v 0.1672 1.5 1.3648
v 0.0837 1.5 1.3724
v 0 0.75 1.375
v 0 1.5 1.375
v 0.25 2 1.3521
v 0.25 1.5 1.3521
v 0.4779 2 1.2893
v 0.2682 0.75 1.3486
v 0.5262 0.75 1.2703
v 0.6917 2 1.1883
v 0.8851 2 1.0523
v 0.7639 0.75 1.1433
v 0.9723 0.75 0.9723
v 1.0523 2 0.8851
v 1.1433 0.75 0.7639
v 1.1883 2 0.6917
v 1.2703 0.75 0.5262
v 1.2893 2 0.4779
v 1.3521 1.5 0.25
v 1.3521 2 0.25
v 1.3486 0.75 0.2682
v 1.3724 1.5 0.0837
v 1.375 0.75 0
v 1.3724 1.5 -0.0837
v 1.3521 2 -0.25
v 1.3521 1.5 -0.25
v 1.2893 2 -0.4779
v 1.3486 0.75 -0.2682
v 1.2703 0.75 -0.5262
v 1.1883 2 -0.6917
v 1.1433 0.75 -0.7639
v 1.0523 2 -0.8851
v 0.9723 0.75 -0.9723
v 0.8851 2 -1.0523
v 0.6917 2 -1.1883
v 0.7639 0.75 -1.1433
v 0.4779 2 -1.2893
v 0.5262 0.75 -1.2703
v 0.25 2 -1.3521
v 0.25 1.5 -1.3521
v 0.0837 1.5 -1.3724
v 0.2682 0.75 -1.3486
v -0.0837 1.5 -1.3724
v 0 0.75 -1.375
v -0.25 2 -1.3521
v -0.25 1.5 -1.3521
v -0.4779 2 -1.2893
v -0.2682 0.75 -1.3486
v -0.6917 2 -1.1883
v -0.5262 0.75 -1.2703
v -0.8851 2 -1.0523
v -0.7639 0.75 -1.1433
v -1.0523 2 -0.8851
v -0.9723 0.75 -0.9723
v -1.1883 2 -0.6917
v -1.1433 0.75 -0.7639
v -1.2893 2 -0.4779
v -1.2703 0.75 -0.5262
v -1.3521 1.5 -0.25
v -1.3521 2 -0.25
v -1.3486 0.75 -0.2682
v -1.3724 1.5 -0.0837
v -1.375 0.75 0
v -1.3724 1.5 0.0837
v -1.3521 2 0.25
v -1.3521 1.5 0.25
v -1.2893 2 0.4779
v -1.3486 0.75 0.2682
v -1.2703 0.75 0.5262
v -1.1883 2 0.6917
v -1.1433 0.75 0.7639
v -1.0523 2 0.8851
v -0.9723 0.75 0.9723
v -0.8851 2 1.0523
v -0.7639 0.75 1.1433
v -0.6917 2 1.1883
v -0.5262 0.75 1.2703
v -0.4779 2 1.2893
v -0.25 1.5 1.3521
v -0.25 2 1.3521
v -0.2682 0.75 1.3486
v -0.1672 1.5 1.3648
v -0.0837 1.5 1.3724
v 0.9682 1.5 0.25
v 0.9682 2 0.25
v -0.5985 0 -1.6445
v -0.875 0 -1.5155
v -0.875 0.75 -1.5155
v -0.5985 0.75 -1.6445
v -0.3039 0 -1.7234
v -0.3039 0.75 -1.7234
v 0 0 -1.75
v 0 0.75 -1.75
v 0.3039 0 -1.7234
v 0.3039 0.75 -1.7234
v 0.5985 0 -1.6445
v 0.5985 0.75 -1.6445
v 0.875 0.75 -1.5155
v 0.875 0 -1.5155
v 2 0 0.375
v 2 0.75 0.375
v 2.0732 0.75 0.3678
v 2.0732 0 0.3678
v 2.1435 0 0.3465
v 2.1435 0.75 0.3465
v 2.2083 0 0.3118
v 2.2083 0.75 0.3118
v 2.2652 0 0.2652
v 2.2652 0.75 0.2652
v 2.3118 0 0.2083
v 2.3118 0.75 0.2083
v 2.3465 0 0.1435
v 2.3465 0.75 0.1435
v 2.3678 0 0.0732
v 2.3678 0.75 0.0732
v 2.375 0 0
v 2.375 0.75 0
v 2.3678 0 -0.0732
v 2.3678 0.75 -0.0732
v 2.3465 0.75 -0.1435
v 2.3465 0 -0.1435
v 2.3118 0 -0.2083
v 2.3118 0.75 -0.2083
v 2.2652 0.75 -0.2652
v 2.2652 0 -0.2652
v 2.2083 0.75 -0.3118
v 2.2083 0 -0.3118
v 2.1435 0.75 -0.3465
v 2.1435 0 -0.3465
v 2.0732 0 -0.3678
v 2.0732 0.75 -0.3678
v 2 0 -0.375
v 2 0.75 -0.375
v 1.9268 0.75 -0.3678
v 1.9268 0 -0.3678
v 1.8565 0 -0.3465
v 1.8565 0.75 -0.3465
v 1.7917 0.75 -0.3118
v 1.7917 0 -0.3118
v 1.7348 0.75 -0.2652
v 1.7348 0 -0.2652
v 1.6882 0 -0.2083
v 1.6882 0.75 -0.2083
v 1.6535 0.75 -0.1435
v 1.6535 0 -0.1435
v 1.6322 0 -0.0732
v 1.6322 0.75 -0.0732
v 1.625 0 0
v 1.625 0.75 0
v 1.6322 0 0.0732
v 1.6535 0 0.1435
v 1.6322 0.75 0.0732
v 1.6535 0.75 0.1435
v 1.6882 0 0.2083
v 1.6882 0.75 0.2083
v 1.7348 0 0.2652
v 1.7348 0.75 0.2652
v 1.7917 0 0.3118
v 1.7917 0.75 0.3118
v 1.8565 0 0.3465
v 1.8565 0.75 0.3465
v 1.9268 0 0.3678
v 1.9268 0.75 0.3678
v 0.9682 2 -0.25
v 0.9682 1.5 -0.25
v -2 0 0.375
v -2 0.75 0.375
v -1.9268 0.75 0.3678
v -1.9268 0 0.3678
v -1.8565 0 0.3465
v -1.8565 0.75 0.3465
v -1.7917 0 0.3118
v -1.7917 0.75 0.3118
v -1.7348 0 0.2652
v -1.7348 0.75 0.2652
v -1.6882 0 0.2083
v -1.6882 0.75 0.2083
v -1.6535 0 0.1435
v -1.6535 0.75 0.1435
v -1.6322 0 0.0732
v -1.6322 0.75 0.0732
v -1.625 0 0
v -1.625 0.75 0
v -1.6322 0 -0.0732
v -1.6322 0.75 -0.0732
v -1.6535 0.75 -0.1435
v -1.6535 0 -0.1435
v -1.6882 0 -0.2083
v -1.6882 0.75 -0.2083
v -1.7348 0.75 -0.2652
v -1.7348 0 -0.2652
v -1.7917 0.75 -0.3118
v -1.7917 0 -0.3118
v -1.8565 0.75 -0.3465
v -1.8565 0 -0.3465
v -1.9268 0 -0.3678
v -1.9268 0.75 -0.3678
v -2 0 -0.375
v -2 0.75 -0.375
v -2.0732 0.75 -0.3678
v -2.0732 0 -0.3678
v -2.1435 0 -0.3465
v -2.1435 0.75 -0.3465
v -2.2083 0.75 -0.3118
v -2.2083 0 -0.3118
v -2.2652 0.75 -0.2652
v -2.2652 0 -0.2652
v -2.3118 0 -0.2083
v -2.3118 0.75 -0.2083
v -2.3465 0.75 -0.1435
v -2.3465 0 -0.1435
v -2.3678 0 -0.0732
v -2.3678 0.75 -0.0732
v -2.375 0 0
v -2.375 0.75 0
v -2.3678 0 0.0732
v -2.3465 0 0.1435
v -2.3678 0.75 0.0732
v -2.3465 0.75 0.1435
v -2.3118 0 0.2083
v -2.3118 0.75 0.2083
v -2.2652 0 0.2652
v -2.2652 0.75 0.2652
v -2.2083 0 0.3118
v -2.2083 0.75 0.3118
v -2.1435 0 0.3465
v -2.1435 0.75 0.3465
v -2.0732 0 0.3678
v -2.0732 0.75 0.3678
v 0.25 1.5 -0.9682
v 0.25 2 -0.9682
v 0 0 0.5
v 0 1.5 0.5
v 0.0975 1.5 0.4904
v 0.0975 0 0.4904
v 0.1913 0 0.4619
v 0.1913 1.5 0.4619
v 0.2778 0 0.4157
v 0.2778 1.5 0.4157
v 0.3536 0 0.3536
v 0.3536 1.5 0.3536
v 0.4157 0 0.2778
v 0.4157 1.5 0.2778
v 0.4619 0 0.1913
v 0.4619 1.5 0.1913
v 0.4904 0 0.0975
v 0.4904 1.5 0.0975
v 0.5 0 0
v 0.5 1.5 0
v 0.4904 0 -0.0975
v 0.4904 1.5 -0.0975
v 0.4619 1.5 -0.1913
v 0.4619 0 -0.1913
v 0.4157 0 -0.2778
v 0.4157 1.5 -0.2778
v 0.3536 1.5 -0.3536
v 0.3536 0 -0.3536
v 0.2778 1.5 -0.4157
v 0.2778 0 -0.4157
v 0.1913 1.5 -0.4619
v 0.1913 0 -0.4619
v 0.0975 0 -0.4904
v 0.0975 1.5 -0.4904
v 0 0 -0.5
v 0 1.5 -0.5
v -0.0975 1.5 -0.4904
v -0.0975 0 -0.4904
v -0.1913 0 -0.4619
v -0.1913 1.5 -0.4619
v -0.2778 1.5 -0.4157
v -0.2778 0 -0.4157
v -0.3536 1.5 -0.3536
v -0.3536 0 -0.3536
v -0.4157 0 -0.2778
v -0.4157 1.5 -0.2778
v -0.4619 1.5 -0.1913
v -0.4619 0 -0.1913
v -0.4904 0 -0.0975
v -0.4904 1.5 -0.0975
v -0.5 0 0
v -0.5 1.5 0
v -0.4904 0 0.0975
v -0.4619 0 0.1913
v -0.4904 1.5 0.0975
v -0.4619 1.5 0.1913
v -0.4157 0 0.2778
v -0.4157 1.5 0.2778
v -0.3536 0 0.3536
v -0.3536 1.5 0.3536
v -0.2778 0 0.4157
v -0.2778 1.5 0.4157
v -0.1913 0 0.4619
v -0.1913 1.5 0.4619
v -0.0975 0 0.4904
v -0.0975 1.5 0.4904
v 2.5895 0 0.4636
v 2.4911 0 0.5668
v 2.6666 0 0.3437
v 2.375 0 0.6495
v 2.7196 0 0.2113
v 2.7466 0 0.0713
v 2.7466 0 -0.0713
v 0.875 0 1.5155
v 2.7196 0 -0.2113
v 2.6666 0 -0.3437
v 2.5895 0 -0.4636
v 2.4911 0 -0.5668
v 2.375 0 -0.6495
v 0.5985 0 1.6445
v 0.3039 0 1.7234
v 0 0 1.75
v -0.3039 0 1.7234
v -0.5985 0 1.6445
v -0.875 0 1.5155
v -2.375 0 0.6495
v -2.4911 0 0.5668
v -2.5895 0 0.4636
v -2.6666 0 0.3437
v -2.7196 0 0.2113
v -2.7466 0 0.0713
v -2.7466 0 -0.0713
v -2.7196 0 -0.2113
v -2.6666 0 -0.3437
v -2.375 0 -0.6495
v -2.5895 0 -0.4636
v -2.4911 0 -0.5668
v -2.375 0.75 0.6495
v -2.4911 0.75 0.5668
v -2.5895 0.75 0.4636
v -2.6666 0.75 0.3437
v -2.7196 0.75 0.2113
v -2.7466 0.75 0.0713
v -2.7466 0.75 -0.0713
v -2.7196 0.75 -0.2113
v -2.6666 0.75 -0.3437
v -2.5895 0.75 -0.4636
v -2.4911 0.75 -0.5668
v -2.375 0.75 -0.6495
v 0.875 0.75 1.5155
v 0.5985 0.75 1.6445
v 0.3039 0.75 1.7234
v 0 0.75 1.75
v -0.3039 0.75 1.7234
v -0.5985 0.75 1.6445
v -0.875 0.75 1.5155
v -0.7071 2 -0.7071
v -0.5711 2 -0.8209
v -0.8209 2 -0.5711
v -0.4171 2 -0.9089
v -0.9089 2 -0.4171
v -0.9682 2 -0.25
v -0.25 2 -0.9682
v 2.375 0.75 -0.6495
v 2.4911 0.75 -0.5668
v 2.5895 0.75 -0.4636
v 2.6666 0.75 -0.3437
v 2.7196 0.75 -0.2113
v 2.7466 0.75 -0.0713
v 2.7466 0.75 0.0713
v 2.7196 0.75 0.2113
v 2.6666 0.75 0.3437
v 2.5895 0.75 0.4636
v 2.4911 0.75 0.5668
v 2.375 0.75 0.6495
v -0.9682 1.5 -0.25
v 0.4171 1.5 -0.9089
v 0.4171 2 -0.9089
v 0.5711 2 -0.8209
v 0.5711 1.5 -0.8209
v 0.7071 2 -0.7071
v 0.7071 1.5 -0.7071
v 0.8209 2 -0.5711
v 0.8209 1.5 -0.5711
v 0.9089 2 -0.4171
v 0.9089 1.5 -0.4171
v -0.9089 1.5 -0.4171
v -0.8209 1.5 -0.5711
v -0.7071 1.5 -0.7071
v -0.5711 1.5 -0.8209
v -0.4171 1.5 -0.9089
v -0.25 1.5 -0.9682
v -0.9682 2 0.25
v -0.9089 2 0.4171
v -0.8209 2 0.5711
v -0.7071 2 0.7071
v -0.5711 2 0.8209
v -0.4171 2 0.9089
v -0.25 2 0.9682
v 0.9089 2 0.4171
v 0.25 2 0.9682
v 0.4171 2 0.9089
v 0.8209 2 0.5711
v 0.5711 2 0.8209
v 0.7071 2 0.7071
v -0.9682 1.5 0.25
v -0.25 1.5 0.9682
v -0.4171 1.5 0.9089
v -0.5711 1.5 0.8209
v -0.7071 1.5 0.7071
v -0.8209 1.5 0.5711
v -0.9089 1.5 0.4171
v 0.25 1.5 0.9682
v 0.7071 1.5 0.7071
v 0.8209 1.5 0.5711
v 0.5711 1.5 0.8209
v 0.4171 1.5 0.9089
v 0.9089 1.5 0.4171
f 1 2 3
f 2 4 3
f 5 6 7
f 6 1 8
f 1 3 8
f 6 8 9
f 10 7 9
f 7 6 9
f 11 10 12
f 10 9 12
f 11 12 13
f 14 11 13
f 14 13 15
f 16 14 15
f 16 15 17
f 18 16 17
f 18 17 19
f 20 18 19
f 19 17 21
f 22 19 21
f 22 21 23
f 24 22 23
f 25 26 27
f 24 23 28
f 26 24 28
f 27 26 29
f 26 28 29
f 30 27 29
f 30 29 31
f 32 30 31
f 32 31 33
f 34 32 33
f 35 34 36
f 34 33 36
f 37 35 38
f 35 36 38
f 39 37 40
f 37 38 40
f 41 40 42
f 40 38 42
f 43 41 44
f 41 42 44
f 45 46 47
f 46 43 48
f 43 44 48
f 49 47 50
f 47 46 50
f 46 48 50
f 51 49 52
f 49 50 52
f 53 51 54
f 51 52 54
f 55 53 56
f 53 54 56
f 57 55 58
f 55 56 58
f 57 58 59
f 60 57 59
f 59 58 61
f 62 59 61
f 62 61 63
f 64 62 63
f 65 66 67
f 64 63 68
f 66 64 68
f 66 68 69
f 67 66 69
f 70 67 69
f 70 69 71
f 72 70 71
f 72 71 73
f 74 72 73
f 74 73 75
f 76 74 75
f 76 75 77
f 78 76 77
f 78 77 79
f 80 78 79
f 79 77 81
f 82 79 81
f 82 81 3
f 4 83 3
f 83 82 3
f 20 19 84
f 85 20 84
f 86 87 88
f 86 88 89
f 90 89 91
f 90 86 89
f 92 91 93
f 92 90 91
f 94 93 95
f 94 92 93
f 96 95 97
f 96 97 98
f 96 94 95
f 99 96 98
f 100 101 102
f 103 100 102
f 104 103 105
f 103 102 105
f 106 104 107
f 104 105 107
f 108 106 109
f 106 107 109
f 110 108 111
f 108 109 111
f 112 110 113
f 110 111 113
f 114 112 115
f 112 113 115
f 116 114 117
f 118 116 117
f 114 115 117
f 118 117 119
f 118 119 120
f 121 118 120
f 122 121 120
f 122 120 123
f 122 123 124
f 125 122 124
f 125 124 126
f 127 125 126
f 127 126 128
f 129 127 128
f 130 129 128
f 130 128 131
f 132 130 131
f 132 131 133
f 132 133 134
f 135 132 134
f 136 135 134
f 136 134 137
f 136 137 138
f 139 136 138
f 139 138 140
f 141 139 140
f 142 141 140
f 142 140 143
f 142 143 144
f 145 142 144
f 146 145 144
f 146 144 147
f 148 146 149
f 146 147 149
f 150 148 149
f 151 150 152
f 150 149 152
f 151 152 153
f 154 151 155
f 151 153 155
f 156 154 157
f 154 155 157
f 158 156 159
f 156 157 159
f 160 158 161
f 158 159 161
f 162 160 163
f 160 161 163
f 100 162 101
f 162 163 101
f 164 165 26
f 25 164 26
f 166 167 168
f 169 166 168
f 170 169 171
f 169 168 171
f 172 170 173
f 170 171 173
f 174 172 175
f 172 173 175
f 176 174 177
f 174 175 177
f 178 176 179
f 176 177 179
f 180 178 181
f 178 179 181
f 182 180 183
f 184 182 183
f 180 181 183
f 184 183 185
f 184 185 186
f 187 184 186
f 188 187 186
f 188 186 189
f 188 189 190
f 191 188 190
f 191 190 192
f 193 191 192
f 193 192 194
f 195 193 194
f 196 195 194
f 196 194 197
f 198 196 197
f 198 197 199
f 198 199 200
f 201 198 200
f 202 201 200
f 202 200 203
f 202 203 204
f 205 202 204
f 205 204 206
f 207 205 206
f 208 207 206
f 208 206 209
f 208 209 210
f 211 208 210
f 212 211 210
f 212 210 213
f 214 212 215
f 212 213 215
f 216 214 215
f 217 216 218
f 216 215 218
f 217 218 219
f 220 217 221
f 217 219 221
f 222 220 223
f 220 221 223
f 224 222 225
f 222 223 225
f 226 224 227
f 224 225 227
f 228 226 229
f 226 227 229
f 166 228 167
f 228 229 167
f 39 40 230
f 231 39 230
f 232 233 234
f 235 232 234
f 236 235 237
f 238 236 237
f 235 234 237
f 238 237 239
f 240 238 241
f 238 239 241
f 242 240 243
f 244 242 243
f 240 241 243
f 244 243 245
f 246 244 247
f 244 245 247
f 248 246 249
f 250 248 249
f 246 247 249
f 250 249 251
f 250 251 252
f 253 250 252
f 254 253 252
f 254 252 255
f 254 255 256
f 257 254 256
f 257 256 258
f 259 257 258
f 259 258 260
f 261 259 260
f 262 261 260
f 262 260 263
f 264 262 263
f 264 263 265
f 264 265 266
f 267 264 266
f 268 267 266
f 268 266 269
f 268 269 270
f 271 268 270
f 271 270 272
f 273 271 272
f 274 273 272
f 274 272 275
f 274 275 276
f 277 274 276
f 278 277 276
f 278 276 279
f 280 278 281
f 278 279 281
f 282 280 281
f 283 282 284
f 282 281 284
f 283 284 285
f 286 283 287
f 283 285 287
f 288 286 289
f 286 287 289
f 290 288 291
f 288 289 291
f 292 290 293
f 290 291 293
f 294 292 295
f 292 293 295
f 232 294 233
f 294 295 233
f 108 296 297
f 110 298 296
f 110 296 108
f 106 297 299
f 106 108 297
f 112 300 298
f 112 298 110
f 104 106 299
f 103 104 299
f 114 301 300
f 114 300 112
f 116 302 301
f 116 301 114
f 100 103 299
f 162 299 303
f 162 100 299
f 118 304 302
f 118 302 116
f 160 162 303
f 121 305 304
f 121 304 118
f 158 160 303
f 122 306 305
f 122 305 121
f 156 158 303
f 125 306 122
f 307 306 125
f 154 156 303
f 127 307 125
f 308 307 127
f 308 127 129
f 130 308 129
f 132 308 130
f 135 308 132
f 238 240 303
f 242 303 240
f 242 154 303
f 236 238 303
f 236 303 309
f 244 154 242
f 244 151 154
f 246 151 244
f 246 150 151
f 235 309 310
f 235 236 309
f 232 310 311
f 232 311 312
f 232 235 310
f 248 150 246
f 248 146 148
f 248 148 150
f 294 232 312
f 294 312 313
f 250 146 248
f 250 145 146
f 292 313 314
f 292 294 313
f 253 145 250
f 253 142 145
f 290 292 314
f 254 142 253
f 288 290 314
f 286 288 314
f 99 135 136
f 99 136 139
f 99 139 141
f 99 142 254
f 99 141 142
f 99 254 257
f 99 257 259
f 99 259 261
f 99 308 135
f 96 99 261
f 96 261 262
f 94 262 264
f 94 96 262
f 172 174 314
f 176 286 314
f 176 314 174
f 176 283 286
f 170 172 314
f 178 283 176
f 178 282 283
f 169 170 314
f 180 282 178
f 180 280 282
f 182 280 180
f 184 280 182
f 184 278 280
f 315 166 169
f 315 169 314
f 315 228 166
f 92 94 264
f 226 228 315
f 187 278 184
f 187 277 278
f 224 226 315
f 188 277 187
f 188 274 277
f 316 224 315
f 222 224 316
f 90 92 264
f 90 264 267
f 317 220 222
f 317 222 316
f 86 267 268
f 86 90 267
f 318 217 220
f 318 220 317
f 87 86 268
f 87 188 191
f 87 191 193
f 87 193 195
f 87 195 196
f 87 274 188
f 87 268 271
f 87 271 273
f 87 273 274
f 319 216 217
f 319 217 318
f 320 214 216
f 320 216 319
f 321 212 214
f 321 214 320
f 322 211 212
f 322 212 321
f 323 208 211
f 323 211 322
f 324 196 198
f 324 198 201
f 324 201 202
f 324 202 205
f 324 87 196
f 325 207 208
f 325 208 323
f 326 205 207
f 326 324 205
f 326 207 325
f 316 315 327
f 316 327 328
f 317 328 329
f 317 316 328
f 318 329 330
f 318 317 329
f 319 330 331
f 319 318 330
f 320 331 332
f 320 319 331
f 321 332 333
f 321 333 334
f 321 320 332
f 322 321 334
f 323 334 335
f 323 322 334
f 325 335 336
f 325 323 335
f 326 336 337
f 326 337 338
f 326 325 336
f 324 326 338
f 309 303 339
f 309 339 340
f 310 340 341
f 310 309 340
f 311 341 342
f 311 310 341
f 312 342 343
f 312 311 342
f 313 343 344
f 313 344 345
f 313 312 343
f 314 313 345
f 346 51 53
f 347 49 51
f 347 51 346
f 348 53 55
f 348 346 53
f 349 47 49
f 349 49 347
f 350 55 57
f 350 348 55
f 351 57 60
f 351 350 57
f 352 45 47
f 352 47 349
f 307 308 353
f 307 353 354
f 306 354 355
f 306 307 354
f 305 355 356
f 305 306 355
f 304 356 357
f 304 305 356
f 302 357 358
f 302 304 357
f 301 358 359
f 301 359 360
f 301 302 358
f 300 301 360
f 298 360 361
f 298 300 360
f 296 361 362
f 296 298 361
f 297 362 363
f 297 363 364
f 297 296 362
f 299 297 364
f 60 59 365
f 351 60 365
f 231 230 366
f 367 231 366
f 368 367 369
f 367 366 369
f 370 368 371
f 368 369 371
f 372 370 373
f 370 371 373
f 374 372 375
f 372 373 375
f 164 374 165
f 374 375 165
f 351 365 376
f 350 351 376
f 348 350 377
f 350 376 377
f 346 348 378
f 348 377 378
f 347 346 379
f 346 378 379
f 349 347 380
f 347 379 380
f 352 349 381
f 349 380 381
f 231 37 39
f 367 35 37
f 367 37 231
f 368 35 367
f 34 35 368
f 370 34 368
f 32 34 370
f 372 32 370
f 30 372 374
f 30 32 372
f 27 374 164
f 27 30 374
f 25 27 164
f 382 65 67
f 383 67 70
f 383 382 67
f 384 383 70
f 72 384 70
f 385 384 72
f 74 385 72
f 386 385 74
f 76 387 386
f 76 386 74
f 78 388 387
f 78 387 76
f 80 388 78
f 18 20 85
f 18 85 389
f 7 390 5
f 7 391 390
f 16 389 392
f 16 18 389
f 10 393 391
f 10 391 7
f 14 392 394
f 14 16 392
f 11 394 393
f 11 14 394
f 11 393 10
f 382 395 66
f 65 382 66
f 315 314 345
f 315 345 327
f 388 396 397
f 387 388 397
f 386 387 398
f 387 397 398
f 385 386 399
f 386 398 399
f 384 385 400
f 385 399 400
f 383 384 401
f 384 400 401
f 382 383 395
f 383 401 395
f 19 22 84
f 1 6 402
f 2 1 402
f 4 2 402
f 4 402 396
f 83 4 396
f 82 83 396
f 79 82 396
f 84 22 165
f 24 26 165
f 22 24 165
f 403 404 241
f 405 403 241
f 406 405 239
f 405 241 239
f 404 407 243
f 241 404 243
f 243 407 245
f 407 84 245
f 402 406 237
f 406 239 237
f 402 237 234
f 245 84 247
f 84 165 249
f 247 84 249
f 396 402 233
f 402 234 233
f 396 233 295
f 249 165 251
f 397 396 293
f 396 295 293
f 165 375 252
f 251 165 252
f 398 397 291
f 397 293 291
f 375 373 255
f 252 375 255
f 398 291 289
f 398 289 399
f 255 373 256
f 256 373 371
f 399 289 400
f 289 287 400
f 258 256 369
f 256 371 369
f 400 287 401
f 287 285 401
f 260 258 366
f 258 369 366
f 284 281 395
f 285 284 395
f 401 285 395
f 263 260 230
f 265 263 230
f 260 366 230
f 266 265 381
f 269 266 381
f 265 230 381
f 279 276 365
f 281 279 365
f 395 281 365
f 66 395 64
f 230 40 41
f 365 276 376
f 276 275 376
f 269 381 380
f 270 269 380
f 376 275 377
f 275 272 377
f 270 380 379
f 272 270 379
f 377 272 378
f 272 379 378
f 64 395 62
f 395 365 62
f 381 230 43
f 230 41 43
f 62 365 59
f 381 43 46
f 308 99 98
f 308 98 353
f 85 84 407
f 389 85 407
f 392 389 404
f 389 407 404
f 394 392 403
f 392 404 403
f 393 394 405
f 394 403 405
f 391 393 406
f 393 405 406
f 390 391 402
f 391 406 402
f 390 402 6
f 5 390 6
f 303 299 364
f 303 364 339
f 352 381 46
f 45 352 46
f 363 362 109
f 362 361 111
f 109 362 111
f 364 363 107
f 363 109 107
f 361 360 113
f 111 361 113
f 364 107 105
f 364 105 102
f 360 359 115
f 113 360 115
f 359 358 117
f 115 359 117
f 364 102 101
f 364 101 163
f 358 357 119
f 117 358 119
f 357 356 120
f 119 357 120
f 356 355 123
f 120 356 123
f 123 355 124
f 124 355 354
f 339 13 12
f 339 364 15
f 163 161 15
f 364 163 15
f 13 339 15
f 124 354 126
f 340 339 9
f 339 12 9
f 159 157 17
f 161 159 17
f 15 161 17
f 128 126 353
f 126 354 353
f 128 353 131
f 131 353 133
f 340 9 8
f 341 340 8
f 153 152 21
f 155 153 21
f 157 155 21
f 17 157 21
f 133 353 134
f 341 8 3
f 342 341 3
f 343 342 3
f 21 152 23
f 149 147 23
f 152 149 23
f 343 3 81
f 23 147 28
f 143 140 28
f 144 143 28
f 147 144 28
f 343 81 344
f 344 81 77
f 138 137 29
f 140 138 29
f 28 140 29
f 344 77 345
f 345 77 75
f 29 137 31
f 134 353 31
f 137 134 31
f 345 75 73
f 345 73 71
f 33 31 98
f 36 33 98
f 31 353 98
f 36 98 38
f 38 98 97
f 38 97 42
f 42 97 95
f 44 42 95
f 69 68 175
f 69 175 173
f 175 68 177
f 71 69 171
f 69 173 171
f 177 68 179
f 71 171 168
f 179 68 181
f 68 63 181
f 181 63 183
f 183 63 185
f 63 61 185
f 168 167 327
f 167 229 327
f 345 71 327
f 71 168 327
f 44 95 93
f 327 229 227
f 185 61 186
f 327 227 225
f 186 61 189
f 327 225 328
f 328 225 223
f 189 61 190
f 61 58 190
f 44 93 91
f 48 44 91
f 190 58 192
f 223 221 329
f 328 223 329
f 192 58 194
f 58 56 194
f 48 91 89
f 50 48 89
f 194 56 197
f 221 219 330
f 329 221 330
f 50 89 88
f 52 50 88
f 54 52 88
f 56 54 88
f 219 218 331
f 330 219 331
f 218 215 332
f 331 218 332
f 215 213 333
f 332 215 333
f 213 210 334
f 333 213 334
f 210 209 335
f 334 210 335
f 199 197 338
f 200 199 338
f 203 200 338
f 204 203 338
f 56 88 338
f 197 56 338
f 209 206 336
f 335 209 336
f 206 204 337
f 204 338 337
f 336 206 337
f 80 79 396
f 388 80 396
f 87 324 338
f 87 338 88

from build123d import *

# Parameters (mm, degrees)
BOSS_EXTRUDE1_DEPTH = 0.75
SKETCH2_R           = 0.375
CUT_EXTRUDE1_DEPTH  = 4.34477204
SKETCH3_R           = 1.375
BOSS_EXTRUDE2_DEPTH = 1.25
SKETCH5_R           = 0.5
CUT_EXTRUDE2_DEPTH  = 4.824264635
CUT_EXTRUDE3_START  = -0.5
CUT_EXTRUDE3_DEPTH  = 0.5


with BuildPart() as part:
    # Sketch1 → Boss-Extrude1 (new body)
    with BuildSketch(Plane(origin=(0, 0, 0), x_dir=(1, 0, 0), z_dir=(0, 1, 0))):
        with BuildLine():
            Line((-2.375, 0.649519053), (-0.875, 1.515544457))
            ThreePointArc((-0.875, 1.515544457), (0, 1.75), (0.875, 1.515544457))
            Line((0.875, 1.515544457), (2.375, 0.649519053))
            ThreePointArc((2.375, 0.649519053), (2.75, 0), (2.375, -0.649519053))
            Line((2.375, -0.649519053), (0.875, -1.515544457))
            ThreePointArc((0.875, -1.515544457), (0, -1.75), (-0.875, -1.515544457))
            Line((-0.875, -1.515544457), (-2.375, -0.649519053))
            ThreePointArc((-2.375, -0.649519053), (-2.75, 0), (-2.375, 0.649519053))
        make_face()
    extrude(amount=BOSS_EXTRUDE1_DEPTH)

    # Sketch2 → Cut-Extrude1 (cut, through all)
    with BuildSketch(Plane(origin=(0, 0.75, 0), x_dir=(1, 0, 0), z_dir=(0, 1, 0))):
        with Locations(Location((-2, 0, 0), (0, 0, 270))):
            Circle(SKETCH2_R)
        with Locations(Location((2, 0, 0), (0, 0, 270))):
            Circle(SKETCH2_R)
    extrude(amount=-CUT_EXTRUDE1_DEPTH, mode=Mode.SUBTRACT)

    # Sketch3 → Boss-Extrude2 (add)
    with BuildSketch(Plane(origin=(0, 0.75, 0), x_dir=(1, 0, 0), z_dir=(0, 1, 0))):
        with Locations(Location((0, 0, 0), (0, 0, 270))):
            Circle(SKETCH3_R)
    extrude(amount=BOSS_EXTRUDE2_DEPTH)

    # Sketch5 → Cut-Extrude2 (cut, through all)
    with BuildSketch(Plane(origin=(0, 2, 0), x_dir=(1, 0, 0), z_dir=(0, 1, 0))):
        with Locations(Location((0, 0, 0), (0, 0, 270))):
            Circle(SKETCH5_R)
    extrude(amount=-CUT_EXTRUDE2_DEPTH, mode=Mode.SUBTRACT)

    # Sketch6 → Cut-Extrude3 (cut)
    with BuildSketch(Plane(origin=(0, 2, 0), x_dir=(1, 0, 0), z_dir=(0, 1, 0)).offset(CUT_EXTRUDE3_START)):
        with BuildLine():
            Line((0.25, 1.352081728), (0.25, 0.968245837))
            ThreePointArc((0.25, 0.968245837), (0.707106781, 0.707106781), (0.968245837, 0.25))
            Line((0.968245837, 0.25), (1.352081728, 0.25))
            ThreePointArc((1.352081728, 0.25), (1.375, 0), (1.352081728, -0.25))
            Line((1.352081728, -0.25), (0.968245837, -0.25))
            ThreePointArc((0.968245837, -0.25), (0.707106781, -0.707106781), (0.25, -0.968245837))
            Line((0.25, -0.968245837), (0.25, -1.352081728))
            ThreePointArc((0.25, -1.352081728), (0, -1.375), (-0.25, -1.352081728))
            Line((-0.25, -1.352081728), (-0.25, -0.968245837))
            ThreePointArc((-0.25, -0.968245837), (-0.707106781, -0.707106781), (-0.968245837, -0.25))
            Line((-0.968245837, -0.25), (-1.352081728, -0.25))
            ThreePointArc((-1.352081728, -0.25), (-1.375, 0), (-1.352081728, 0.25))
            Line((-1.352081728, 0.25), (-0.968245837, 0.25))
            ThreePointArc((-0.968245837, 0.25), (-0.707106781, 0.707106781), (-0.25, 0.968245837))
            Line((-0.25, 0.968245837), (-0.25, 1.352081728))
            ThreePointArc((-0.25, 1.352081728), (0, 1.375), (0.25, 1.352081728))
        make_face()
    extrude(amount=CUT_EXTRUDE3_DEPTH, mode=Mode.SUBTRACT)


solid = part.part
